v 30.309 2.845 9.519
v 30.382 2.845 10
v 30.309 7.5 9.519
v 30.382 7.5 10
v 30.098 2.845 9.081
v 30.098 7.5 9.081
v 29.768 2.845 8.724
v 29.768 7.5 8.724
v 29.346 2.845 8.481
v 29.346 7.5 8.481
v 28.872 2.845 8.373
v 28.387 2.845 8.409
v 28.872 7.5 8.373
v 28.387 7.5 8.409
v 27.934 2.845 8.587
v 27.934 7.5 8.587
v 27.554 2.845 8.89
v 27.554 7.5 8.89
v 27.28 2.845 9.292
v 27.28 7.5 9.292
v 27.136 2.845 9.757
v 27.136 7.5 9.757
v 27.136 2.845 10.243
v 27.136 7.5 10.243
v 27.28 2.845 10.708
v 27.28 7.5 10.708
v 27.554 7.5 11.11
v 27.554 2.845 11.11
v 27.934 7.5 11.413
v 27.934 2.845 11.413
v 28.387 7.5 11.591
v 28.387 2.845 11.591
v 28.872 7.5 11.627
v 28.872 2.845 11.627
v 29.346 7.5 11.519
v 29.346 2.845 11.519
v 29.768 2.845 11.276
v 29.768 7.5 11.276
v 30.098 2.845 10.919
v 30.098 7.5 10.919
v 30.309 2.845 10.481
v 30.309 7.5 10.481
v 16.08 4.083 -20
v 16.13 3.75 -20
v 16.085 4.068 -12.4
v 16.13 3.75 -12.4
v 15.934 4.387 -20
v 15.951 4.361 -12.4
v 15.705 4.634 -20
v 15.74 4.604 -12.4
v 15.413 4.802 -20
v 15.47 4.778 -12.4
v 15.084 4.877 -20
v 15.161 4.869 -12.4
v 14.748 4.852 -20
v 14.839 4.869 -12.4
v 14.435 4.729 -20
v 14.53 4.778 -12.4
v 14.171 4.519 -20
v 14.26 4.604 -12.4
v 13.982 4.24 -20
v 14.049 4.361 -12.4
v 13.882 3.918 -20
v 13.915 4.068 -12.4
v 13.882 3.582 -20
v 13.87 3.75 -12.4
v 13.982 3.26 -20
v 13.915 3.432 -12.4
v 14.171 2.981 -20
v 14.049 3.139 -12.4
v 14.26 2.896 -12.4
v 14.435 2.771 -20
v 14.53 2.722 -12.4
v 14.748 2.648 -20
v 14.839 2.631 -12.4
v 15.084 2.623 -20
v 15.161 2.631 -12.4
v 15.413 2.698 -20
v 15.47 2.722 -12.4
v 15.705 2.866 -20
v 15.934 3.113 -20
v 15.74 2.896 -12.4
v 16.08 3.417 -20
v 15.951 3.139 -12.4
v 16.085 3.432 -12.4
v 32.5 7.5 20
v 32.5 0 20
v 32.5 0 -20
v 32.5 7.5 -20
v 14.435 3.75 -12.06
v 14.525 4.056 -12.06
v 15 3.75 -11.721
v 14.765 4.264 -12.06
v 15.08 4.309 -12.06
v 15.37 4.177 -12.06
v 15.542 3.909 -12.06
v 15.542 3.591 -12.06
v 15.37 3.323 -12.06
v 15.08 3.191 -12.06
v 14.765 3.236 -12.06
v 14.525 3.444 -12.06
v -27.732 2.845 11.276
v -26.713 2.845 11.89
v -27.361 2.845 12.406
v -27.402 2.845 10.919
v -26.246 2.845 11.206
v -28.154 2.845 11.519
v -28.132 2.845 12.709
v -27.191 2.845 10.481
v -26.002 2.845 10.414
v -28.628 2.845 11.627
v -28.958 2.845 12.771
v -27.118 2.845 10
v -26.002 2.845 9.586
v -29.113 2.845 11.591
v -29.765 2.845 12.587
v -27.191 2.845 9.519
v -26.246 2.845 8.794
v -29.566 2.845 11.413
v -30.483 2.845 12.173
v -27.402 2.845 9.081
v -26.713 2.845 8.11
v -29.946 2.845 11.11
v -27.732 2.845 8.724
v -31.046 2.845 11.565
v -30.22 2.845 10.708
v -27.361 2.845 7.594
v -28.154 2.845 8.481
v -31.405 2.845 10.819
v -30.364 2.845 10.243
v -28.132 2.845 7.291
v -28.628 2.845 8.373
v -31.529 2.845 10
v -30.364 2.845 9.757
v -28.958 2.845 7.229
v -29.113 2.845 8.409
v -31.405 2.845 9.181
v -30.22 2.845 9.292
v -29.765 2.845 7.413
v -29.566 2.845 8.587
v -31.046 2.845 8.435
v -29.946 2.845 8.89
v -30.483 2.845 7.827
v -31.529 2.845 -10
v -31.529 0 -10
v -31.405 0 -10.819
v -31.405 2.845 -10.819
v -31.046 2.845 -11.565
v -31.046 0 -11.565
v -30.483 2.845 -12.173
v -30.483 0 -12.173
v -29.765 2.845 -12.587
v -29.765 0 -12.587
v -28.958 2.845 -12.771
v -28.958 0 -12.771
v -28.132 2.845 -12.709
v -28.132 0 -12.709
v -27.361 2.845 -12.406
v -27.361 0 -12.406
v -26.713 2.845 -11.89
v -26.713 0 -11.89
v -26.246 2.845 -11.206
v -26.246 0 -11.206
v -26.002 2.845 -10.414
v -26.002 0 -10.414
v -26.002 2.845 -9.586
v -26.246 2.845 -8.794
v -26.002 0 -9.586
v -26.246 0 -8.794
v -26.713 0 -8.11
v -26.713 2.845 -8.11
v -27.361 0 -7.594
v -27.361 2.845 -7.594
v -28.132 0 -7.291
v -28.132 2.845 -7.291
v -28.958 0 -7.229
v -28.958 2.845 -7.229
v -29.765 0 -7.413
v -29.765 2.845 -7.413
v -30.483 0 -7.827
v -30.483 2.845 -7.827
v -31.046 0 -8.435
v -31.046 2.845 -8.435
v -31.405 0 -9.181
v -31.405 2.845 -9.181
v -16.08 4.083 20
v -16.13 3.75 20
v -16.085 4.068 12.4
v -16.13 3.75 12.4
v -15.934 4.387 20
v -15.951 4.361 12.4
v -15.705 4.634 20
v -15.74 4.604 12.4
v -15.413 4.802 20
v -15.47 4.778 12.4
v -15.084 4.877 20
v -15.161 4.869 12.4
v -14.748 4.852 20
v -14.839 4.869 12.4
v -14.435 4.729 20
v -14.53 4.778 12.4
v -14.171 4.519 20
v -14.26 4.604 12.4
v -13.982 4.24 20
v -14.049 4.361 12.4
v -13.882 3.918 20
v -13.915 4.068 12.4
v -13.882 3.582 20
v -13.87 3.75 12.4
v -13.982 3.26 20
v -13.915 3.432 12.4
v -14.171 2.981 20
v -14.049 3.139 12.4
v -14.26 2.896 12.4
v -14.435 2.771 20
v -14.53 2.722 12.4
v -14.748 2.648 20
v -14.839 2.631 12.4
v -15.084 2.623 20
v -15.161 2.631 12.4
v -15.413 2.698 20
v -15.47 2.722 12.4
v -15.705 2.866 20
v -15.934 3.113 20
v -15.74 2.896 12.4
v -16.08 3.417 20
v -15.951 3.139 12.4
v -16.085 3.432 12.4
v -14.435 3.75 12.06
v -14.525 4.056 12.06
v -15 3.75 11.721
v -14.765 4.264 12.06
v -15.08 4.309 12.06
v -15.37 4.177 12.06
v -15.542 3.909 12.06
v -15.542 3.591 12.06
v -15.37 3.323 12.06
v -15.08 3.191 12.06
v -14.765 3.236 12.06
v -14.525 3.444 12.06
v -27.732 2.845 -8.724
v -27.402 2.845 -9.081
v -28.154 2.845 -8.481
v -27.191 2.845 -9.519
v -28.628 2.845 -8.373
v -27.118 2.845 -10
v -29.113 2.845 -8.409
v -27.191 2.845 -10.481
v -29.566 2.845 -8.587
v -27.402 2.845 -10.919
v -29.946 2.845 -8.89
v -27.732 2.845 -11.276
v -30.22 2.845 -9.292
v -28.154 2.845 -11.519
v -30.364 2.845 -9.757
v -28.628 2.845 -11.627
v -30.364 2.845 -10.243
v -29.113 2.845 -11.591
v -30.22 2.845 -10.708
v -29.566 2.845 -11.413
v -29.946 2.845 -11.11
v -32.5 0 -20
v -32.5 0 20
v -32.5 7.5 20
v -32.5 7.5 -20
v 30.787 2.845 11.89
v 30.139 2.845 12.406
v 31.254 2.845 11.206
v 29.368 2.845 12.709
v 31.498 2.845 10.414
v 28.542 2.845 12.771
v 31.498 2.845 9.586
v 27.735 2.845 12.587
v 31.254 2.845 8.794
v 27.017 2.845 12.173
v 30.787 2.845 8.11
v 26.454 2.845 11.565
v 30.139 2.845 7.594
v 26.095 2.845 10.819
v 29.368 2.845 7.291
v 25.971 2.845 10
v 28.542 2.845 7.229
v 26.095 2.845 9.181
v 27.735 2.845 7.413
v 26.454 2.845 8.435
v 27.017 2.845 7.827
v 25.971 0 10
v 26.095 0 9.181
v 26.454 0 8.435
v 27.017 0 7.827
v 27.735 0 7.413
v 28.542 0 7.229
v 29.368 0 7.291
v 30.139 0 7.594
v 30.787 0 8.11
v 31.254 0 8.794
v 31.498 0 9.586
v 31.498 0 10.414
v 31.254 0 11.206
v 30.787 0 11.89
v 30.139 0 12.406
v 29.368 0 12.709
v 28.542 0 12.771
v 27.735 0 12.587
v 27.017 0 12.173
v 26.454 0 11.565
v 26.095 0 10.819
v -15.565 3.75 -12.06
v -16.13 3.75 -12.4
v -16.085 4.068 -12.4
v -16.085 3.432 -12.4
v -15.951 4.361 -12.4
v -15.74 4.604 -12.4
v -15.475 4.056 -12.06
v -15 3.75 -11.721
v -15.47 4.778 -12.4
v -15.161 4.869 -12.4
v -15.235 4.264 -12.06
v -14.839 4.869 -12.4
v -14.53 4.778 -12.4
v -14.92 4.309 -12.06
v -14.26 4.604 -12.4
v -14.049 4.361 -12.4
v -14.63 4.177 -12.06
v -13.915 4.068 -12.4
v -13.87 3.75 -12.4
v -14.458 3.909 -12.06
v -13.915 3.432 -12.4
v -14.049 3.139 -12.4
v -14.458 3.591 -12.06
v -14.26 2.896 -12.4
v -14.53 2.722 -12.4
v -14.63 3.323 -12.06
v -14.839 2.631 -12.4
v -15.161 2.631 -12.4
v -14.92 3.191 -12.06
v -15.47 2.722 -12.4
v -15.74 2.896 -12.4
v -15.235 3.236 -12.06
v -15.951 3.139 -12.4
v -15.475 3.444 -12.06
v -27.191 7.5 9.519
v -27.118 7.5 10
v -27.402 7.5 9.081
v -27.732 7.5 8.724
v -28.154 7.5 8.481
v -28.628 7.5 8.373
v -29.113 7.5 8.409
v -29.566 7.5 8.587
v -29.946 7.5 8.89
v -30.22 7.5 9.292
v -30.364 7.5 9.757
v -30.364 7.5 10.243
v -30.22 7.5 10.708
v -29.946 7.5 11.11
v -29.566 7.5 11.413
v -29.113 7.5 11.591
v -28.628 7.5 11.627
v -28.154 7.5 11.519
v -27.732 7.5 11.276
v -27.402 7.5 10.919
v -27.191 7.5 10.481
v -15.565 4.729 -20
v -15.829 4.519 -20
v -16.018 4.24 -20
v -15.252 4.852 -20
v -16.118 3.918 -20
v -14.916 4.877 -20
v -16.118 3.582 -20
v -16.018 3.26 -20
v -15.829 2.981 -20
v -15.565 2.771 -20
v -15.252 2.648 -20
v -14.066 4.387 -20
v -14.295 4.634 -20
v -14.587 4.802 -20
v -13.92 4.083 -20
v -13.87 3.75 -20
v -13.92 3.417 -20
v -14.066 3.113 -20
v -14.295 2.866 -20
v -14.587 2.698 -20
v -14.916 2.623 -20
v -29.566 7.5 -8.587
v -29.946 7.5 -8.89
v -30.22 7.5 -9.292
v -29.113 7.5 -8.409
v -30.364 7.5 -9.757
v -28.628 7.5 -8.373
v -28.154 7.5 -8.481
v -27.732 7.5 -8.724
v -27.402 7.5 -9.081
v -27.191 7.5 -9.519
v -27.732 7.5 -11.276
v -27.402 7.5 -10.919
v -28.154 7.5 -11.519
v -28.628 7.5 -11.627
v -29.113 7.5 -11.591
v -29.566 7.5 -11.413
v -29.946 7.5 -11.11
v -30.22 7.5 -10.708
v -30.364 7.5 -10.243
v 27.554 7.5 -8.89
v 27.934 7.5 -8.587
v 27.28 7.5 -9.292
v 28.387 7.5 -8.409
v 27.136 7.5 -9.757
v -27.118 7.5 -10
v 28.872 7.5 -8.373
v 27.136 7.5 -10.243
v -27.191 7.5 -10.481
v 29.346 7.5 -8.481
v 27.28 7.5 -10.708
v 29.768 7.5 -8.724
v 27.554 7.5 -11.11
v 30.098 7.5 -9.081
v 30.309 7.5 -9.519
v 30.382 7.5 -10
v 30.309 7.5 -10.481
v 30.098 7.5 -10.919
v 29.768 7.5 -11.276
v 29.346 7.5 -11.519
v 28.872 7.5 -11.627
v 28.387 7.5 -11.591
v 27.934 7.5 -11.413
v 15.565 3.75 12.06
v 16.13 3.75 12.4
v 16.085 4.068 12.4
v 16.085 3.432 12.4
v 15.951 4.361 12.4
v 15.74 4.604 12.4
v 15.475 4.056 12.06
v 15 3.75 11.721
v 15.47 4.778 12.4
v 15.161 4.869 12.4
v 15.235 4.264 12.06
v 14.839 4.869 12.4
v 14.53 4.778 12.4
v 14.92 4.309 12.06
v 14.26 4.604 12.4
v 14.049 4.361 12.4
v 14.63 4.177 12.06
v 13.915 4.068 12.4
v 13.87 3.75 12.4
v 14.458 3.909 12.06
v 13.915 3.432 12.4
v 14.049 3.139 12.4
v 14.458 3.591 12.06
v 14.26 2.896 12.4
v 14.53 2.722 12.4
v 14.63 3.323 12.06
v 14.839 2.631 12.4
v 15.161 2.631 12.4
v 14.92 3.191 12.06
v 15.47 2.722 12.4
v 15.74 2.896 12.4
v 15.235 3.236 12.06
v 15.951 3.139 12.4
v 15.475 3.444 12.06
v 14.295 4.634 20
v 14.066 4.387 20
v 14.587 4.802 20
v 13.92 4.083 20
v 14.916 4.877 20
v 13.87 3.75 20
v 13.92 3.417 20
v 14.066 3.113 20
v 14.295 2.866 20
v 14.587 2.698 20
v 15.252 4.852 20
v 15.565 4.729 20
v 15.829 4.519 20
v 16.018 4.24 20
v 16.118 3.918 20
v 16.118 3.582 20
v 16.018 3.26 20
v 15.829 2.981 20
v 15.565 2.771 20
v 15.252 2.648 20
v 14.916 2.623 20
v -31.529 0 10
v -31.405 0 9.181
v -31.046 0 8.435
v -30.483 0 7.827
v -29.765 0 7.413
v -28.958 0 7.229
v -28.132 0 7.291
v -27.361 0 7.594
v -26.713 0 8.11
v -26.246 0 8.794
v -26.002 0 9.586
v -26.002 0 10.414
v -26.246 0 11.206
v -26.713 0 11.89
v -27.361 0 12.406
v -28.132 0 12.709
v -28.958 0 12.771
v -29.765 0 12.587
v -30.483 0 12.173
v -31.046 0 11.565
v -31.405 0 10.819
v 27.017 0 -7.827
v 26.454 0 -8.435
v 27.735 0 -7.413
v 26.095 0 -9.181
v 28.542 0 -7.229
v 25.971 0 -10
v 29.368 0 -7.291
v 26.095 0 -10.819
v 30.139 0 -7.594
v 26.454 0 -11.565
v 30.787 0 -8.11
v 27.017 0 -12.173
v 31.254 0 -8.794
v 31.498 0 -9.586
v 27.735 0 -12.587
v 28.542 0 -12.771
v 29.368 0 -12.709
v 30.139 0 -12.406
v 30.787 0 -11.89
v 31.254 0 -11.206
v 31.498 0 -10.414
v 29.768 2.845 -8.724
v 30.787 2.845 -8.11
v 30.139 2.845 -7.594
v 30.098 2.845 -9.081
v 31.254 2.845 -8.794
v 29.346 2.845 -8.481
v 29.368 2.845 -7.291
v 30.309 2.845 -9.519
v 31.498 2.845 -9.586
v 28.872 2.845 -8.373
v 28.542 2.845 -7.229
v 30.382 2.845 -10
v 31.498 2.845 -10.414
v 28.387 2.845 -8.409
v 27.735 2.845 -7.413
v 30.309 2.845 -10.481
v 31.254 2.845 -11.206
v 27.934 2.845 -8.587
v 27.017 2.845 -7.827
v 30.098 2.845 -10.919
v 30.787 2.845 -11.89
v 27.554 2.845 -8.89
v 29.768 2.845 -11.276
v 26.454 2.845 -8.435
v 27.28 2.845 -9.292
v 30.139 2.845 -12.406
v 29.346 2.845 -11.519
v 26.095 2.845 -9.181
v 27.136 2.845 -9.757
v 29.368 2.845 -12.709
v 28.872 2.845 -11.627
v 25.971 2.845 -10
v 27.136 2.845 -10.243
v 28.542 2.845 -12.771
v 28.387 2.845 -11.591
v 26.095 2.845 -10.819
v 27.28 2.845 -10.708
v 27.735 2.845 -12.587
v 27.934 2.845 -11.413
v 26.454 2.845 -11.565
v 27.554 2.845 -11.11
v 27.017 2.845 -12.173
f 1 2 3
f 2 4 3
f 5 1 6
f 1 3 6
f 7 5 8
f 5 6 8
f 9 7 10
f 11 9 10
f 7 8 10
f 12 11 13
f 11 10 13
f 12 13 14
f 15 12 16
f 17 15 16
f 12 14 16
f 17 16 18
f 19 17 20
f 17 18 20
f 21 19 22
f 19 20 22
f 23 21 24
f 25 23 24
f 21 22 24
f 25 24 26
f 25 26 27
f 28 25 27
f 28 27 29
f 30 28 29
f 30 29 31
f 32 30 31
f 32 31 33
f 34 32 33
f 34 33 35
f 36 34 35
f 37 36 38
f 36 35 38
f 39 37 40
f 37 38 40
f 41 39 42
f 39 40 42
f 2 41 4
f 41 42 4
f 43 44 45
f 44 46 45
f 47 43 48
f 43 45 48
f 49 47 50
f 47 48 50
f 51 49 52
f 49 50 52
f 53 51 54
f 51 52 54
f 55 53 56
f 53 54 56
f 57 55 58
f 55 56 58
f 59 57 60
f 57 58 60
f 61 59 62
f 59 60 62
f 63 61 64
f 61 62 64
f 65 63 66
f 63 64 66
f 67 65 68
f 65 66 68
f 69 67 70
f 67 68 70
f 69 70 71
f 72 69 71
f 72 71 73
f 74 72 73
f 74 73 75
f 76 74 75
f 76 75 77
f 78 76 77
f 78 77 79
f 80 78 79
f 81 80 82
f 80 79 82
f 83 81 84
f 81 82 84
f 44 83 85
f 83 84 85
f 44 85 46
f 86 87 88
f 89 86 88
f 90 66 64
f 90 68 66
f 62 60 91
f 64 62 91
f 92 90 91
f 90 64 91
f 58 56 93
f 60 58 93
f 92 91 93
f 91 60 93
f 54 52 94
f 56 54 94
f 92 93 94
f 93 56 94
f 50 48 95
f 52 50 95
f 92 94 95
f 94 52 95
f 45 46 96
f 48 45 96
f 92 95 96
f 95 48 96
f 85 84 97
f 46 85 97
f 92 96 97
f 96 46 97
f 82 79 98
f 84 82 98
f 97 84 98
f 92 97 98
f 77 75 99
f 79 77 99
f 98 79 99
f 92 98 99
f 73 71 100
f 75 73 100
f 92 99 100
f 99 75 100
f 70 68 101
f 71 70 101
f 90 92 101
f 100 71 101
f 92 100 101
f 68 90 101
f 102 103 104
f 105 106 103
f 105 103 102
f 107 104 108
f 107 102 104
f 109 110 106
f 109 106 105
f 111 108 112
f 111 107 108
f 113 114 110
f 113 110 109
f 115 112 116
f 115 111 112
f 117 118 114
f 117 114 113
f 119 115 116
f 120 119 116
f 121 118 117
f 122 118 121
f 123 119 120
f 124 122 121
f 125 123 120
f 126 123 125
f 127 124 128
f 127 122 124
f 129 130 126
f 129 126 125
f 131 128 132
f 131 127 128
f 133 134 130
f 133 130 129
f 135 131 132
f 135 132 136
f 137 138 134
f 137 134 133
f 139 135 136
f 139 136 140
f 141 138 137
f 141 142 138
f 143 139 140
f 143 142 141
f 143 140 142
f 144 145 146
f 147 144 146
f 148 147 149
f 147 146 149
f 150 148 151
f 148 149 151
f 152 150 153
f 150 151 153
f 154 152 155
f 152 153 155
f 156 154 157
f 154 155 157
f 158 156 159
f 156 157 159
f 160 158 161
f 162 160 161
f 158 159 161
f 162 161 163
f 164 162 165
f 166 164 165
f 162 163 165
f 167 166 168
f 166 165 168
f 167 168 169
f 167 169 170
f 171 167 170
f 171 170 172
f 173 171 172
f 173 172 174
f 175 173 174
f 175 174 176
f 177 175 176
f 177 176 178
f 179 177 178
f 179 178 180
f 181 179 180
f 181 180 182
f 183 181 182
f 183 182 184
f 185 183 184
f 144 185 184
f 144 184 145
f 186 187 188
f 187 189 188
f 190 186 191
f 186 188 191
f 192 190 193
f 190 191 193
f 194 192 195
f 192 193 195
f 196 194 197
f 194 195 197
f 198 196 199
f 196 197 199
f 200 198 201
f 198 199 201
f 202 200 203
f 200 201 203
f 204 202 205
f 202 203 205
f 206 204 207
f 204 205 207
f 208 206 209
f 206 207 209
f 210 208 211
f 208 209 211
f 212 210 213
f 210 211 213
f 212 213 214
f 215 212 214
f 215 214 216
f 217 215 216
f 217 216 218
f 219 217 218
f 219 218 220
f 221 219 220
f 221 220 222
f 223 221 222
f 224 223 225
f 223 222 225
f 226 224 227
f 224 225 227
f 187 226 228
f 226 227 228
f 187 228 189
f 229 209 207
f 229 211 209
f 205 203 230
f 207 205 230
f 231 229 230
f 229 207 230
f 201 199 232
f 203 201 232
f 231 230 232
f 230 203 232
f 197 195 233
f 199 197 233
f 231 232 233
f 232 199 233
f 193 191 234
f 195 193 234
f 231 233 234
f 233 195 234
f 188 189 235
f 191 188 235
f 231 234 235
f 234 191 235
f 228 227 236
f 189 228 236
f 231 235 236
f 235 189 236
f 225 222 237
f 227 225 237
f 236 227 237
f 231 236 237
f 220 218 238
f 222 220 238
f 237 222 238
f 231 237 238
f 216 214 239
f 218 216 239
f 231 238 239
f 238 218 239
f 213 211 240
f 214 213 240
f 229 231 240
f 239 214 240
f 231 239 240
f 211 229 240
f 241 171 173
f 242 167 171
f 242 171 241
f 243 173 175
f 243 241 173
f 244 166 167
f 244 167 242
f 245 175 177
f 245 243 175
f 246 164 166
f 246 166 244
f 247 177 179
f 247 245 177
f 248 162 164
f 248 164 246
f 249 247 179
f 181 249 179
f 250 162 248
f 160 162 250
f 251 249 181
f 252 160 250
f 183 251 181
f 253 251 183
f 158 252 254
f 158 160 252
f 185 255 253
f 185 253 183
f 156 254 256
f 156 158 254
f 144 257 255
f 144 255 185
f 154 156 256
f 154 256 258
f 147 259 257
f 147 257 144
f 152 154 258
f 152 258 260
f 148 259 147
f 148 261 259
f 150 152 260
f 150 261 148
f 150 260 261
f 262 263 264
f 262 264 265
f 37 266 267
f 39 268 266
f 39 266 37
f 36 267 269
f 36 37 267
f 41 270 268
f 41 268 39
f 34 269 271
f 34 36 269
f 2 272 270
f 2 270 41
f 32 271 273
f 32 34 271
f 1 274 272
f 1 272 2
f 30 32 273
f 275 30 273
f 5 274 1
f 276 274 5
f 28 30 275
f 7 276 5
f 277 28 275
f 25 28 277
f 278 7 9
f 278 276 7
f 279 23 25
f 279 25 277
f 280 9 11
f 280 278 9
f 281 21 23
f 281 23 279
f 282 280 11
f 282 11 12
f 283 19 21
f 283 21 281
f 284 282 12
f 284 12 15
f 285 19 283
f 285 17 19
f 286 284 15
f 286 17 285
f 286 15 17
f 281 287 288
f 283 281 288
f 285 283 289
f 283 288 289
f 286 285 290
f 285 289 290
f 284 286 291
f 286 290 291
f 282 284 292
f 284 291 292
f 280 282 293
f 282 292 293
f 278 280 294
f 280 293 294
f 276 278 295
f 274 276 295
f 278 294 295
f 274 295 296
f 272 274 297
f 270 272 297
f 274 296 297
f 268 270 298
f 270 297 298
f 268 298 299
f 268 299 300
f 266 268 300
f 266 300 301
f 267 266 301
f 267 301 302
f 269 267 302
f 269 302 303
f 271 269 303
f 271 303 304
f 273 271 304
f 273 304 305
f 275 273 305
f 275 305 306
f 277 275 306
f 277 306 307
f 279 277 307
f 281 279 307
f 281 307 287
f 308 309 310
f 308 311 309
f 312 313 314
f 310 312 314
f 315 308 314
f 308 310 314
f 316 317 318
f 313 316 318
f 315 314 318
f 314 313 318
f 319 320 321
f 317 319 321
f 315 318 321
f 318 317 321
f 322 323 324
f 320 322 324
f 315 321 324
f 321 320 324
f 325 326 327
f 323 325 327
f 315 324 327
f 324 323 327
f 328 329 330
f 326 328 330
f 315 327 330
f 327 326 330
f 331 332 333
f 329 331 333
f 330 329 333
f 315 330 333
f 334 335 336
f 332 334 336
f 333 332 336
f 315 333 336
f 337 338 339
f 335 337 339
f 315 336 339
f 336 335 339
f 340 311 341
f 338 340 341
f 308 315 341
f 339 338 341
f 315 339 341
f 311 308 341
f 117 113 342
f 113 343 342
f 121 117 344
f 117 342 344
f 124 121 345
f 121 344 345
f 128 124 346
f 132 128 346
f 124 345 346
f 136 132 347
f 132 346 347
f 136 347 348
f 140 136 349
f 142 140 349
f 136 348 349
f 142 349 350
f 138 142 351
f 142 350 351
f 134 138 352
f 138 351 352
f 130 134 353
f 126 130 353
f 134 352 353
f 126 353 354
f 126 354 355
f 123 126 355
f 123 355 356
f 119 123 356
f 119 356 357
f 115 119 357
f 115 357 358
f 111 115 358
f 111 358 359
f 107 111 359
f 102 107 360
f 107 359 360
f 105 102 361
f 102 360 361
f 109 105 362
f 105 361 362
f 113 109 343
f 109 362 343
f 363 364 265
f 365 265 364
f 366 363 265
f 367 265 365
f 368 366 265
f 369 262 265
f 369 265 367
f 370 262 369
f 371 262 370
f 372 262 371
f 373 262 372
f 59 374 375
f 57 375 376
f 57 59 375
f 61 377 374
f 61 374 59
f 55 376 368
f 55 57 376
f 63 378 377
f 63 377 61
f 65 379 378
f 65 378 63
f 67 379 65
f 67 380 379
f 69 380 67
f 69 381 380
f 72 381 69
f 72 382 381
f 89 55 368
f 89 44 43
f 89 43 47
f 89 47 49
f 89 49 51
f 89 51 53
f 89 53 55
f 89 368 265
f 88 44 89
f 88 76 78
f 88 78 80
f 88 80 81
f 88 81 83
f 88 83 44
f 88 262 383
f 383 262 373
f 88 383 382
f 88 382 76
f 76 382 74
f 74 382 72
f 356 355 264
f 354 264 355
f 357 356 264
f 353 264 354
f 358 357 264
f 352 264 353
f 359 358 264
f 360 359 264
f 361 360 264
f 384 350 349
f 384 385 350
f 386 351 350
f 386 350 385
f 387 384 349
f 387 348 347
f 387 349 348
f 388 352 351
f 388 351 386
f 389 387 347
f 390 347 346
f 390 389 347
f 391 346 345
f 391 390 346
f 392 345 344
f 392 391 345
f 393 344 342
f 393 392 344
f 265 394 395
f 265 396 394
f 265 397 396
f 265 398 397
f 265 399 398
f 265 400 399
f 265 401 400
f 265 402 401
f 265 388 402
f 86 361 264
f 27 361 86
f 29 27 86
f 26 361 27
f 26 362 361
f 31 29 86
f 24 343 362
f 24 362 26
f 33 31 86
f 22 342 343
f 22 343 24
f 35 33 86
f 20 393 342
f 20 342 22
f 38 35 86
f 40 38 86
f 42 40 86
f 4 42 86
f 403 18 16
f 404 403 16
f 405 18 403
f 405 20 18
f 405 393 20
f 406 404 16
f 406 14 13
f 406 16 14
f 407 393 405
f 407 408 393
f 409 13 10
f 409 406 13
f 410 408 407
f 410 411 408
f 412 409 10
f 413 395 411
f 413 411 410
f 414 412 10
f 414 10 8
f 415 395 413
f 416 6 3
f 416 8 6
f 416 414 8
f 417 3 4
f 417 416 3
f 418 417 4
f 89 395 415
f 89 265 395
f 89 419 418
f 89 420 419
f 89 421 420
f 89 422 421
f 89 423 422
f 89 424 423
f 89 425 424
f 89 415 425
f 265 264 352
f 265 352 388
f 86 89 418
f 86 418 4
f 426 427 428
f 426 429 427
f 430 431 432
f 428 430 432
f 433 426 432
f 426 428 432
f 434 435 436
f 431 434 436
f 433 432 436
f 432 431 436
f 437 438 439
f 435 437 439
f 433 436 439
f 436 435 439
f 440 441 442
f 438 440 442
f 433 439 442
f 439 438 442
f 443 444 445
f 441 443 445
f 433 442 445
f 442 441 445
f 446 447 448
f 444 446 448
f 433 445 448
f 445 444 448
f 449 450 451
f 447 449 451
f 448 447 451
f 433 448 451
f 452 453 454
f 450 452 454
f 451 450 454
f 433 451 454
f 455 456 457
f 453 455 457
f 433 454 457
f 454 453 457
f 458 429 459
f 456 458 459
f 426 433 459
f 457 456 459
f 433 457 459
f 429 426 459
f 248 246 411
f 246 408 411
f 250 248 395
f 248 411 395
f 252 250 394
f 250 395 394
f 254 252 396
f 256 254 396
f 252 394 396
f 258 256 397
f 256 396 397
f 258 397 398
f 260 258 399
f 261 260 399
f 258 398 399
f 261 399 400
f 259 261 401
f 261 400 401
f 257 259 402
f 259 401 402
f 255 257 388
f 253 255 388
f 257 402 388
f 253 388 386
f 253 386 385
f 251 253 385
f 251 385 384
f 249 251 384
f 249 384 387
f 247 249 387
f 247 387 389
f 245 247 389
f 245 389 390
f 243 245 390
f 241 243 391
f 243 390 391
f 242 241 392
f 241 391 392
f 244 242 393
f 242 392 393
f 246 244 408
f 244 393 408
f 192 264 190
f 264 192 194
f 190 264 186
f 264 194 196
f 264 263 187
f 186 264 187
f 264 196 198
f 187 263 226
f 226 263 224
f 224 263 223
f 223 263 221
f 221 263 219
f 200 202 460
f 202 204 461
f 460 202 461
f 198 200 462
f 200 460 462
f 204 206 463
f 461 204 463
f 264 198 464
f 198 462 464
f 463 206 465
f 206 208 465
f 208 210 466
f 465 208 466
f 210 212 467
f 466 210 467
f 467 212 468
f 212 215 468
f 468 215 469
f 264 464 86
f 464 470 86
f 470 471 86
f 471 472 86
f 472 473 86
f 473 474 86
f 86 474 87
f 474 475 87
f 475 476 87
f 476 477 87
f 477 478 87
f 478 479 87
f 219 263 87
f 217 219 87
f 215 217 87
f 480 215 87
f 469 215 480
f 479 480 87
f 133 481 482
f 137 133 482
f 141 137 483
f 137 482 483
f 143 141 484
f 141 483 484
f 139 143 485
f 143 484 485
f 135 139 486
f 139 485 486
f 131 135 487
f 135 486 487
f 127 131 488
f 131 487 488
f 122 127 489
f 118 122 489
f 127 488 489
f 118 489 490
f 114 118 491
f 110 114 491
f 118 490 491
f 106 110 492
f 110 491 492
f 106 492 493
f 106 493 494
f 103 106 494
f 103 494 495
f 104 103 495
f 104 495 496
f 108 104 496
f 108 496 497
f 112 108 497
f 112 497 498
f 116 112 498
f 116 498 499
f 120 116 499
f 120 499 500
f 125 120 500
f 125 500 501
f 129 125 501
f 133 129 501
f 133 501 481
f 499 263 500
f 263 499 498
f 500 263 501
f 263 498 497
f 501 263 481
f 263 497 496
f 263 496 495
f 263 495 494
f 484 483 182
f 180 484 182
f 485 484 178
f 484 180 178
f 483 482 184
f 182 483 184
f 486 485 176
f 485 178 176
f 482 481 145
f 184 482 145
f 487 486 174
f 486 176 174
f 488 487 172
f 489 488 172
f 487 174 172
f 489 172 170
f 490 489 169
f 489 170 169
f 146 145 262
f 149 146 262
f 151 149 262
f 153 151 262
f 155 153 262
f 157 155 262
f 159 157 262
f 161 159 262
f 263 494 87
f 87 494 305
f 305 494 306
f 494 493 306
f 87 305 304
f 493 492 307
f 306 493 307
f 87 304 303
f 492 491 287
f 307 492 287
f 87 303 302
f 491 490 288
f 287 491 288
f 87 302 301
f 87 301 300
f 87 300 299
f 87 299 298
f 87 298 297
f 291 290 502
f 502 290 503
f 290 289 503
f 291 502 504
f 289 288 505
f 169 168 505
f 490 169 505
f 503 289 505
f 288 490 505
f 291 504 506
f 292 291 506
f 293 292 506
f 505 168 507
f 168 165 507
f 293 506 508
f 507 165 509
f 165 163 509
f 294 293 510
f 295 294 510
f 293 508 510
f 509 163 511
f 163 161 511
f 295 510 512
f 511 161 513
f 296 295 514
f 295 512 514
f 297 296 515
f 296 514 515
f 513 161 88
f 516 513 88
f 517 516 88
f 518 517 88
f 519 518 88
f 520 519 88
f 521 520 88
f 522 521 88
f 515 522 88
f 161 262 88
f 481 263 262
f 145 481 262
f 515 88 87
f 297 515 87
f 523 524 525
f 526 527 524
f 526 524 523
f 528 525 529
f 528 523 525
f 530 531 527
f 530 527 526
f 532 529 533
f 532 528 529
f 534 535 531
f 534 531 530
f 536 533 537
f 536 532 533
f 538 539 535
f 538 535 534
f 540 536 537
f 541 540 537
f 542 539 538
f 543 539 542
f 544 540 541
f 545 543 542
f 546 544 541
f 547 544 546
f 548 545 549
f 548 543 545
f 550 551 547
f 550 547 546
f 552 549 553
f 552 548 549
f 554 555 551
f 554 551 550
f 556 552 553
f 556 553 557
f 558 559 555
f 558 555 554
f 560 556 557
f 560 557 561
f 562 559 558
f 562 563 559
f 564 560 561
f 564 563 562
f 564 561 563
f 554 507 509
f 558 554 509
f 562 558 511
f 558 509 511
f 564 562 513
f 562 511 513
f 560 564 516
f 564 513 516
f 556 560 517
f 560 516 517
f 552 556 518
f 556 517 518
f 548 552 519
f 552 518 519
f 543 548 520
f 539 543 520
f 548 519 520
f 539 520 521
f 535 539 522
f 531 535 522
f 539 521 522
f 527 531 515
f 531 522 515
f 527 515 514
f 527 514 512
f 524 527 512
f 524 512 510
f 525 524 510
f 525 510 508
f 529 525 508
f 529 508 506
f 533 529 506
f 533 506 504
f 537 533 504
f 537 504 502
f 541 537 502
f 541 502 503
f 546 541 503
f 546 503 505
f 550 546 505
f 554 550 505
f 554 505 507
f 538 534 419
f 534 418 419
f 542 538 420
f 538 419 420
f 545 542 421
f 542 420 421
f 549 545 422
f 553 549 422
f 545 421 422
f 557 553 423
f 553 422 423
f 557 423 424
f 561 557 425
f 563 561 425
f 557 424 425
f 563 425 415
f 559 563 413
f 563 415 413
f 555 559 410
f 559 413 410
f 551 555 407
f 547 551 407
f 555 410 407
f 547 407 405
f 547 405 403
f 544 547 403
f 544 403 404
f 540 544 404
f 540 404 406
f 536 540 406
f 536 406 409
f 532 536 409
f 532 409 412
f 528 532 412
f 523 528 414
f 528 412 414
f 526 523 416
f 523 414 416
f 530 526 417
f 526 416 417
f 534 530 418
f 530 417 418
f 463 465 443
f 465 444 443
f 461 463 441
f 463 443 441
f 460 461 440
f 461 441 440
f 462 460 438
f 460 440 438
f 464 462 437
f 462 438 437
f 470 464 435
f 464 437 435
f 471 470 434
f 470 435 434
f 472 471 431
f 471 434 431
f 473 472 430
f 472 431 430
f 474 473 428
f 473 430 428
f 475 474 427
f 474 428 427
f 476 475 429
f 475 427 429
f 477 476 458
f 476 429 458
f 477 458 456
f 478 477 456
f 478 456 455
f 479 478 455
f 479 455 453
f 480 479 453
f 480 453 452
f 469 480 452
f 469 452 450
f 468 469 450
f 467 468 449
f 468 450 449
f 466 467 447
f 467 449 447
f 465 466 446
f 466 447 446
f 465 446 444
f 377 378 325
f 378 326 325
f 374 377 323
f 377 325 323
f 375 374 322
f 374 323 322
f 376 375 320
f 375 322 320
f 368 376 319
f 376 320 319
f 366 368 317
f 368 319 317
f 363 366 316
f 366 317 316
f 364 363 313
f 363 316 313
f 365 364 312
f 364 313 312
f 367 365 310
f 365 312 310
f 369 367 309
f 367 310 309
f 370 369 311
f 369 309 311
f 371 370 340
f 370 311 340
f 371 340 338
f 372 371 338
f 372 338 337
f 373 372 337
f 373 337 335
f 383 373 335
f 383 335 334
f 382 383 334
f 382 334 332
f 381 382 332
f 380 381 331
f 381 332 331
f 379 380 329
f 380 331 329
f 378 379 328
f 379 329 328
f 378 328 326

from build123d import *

# Parameters (mm, degrees)
SKETCH1_W                                      = 65
SKETCH1_H                                      = 40
BOSS_EXTRUDE1_DEPTH                            = 7.5
F_4_40_TAPPED_HOLE1_D                          = 2.2606
F_4_40_TAPPED_HOLE1_DEPTH                      = 7.6
F_4_40_TAPPED_HOLE1_TIP                        = 0.679152758
F_4_40_TAPPED_HOLE2_D                          = 2.2606
F_4_40_TAPPED_HOLE2_DEPTH                      = 7.6
F_4_40_TAPPED_HOLE2_TIP                        = 0.679152758
CBORE_FOR_4_SOCKET_HEAD_CAP_SCREW1_D           = 3.2639
CBORE_FOR_4_SOCKET_HEAD_CAP_SCREW1_CBORE_D     = 5.55752
CBORE_FOR_4_SOCKET_HEAD_CAP_SCREW1_CBORE_DEPTH = 2.8448


with BuildPart() as part:
    # Sketch1 → Boss-Extrude1 (new body)
    with BuildSketch(Plane(origin=(0, 0, 0), x_dir=(1, 0, 0), z_dir=(0, 1, 0))):
        Rectangle(SKETCH1_W, SKETCH1_H)
    extrude(amount=BOSS_EXTRUDE1_DEPTH)

    # #4-40 Tapped Hole1
    with Locations(Plane.XY.offset(20)):
        with Locations((-15, 3.75), (15, 3.75)):
            Hole(F_4_40_TAPPED_HOLE1_D / 2, depth=F_4_40_TAPPED_HOLE1_DEPTH)
            with Locations((0, 0, -(F_4_40_TAPPED_HOLE1_DEPTH + F_4_40_TAPPED_HOLE1_TIP / 2))):  # 118° drill point
                Cone(0, F_4_40_TAPPED_HOLE1_D / 2, F_4_40_TAPPED_HOLE1_TIP, mode=Mode.SUBTRACT)

    # #4-40 Tapped Hole2
    with Locations(Plane(origin=(0, 0, -20), x_dir=(-1, 0, 0), z_dir=(0, 0, -1))):
        with Locations((-15, 3.75), (15, 3.75)):
            Hole(F_4_40_TAPPED_HOLE2_D / 2, depth=F_4_40_TAPPED_HOLE2_DEPTH)
            with Locations((0, 0, -(F_4_40_TAPPED_HOLE2_DEPTH + F_4_40_TAPPED_HOLE2_TIP / 2))):  # 118° drill point
                Cone(0, F_4_40_TAPPED_HOLE2_D / 2, F_4_40_TAPPED_HOLE2_TIP, mode=Mode.SUBTRACT)

    # CBORE for #4 Socket Head Cap Screw1 (through all)
    with Locations(Plane(origin=(0, 0, 0), x_dir=(-1, 0, 0), z_dir=(0, -1, 0))):
        with Locations((-28.75, -10), (-28.75, 10), (28.75, 10), (28.75, -10)):
            CounterBoreHole(CBORE_FOR_4_SOCKET_HEAD_CAP_SCREW1_D / 2, CBORE_FOR_4_SOCKET_HEAD_CAP_SCREW1_CBORE_D / 2, CBORE_FOR_4_SOCKET_HEAD_CAP_SCREW1_CBORE_DEPTH)


solid = part.part
